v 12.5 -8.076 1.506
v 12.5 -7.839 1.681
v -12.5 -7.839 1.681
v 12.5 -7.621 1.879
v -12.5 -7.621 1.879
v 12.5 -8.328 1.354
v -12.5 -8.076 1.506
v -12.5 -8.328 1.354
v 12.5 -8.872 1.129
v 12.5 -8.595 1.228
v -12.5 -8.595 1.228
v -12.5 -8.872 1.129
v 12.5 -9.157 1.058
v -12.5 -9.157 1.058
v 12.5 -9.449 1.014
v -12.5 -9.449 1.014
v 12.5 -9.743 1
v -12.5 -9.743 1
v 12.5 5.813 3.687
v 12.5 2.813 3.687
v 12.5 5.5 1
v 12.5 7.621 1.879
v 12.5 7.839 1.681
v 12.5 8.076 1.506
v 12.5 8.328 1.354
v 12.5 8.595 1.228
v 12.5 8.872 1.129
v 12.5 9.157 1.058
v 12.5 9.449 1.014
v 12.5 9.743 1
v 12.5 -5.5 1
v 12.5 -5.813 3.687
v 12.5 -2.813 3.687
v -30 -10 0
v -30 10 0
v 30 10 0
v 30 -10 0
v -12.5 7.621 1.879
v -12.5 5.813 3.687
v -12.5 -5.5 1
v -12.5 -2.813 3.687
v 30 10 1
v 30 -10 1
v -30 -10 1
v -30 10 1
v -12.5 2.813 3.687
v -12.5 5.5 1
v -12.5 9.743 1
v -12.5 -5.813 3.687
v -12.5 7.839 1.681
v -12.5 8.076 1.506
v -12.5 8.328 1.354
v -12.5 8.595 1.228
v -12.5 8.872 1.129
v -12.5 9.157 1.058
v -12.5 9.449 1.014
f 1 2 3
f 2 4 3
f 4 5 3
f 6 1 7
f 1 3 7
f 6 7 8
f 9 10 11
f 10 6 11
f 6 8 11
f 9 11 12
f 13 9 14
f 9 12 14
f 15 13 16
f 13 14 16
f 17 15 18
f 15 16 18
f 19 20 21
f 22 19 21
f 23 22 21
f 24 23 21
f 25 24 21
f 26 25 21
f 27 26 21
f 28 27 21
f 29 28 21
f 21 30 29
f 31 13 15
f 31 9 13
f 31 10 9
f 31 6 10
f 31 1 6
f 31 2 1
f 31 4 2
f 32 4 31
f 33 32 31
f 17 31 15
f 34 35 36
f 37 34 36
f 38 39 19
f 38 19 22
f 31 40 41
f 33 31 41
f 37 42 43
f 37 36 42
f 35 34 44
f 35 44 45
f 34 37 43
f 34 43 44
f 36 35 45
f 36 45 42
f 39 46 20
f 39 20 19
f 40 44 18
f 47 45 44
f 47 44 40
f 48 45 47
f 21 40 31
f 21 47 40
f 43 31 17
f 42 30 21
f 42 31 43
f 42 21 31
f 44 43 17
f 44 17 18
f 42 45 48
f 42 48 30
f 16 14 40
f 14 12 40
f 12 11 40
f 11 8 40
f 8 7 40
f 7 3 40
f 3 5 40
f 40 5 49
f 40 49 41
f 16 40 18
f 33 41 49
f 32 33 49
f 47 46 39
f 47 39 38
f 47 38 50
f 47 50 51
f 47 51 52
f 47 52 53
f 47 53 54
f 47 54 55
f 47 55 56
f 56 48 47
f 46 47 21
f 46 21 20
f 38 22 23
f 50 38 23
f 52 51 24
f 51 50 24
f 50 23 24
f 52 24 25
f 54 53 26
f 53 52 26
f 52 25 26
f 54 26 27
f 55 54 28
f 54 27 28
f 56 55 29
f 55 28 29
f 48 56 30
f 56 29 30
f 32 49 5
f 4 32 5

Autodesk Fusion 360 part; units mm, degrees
sketch "Sketch1" plane through (0, 0, 0) normal (0, 0, 1) x (1, 0, 0)
  line L0 (30, -10) -> (-30, -10)
  line L1 (-30, -10) -> (-30, 10)
  line L2 (-30, 10) -> (30, 10)
  line L3 (30, 10) -> (30, -10)
  line L4 (30, -10) -> (-30, 10) construction
  line L5 (-30, -10) -> (30, 10) construction
  dimension "d1" = 60
  dimension "d2" = 20
extrude "Extrude1" add sketch "Sketch1" along normal blind 1
sketch "Sketch2" plane through (0, 0, 0) normal (1, 0, 0) x (0, 1, 0)
  line L0 (5.5, 1) -> (2.813, 3.687)
  line L1 (5.5, 1) -> (9.3, 1) construction
  line L2 (2.813, 3.687) -> (5.813, 3.687)
  line L3 (5.813, 3.687) -> (8.5, 1)
  line L4 (-5.5, 1) -> (-2.813, 3.687)
  line L5 (-5.813, 3.687) -> (-8.5, 1)
  line L6 (-2.813, 3.687) -> (-5.813, 3.687)
  line L7 (-8.5, 1) -> (-5.5, 1)
  line L8 (5.5, 1) -> (8.5, 1)
extrude "Extrude2" add sketch "Sketch2" along normal mid plane 25
fillet "Fillet1" radius 3 2 edges at (0, -8.5, 1) (0, 8.5, 1)
